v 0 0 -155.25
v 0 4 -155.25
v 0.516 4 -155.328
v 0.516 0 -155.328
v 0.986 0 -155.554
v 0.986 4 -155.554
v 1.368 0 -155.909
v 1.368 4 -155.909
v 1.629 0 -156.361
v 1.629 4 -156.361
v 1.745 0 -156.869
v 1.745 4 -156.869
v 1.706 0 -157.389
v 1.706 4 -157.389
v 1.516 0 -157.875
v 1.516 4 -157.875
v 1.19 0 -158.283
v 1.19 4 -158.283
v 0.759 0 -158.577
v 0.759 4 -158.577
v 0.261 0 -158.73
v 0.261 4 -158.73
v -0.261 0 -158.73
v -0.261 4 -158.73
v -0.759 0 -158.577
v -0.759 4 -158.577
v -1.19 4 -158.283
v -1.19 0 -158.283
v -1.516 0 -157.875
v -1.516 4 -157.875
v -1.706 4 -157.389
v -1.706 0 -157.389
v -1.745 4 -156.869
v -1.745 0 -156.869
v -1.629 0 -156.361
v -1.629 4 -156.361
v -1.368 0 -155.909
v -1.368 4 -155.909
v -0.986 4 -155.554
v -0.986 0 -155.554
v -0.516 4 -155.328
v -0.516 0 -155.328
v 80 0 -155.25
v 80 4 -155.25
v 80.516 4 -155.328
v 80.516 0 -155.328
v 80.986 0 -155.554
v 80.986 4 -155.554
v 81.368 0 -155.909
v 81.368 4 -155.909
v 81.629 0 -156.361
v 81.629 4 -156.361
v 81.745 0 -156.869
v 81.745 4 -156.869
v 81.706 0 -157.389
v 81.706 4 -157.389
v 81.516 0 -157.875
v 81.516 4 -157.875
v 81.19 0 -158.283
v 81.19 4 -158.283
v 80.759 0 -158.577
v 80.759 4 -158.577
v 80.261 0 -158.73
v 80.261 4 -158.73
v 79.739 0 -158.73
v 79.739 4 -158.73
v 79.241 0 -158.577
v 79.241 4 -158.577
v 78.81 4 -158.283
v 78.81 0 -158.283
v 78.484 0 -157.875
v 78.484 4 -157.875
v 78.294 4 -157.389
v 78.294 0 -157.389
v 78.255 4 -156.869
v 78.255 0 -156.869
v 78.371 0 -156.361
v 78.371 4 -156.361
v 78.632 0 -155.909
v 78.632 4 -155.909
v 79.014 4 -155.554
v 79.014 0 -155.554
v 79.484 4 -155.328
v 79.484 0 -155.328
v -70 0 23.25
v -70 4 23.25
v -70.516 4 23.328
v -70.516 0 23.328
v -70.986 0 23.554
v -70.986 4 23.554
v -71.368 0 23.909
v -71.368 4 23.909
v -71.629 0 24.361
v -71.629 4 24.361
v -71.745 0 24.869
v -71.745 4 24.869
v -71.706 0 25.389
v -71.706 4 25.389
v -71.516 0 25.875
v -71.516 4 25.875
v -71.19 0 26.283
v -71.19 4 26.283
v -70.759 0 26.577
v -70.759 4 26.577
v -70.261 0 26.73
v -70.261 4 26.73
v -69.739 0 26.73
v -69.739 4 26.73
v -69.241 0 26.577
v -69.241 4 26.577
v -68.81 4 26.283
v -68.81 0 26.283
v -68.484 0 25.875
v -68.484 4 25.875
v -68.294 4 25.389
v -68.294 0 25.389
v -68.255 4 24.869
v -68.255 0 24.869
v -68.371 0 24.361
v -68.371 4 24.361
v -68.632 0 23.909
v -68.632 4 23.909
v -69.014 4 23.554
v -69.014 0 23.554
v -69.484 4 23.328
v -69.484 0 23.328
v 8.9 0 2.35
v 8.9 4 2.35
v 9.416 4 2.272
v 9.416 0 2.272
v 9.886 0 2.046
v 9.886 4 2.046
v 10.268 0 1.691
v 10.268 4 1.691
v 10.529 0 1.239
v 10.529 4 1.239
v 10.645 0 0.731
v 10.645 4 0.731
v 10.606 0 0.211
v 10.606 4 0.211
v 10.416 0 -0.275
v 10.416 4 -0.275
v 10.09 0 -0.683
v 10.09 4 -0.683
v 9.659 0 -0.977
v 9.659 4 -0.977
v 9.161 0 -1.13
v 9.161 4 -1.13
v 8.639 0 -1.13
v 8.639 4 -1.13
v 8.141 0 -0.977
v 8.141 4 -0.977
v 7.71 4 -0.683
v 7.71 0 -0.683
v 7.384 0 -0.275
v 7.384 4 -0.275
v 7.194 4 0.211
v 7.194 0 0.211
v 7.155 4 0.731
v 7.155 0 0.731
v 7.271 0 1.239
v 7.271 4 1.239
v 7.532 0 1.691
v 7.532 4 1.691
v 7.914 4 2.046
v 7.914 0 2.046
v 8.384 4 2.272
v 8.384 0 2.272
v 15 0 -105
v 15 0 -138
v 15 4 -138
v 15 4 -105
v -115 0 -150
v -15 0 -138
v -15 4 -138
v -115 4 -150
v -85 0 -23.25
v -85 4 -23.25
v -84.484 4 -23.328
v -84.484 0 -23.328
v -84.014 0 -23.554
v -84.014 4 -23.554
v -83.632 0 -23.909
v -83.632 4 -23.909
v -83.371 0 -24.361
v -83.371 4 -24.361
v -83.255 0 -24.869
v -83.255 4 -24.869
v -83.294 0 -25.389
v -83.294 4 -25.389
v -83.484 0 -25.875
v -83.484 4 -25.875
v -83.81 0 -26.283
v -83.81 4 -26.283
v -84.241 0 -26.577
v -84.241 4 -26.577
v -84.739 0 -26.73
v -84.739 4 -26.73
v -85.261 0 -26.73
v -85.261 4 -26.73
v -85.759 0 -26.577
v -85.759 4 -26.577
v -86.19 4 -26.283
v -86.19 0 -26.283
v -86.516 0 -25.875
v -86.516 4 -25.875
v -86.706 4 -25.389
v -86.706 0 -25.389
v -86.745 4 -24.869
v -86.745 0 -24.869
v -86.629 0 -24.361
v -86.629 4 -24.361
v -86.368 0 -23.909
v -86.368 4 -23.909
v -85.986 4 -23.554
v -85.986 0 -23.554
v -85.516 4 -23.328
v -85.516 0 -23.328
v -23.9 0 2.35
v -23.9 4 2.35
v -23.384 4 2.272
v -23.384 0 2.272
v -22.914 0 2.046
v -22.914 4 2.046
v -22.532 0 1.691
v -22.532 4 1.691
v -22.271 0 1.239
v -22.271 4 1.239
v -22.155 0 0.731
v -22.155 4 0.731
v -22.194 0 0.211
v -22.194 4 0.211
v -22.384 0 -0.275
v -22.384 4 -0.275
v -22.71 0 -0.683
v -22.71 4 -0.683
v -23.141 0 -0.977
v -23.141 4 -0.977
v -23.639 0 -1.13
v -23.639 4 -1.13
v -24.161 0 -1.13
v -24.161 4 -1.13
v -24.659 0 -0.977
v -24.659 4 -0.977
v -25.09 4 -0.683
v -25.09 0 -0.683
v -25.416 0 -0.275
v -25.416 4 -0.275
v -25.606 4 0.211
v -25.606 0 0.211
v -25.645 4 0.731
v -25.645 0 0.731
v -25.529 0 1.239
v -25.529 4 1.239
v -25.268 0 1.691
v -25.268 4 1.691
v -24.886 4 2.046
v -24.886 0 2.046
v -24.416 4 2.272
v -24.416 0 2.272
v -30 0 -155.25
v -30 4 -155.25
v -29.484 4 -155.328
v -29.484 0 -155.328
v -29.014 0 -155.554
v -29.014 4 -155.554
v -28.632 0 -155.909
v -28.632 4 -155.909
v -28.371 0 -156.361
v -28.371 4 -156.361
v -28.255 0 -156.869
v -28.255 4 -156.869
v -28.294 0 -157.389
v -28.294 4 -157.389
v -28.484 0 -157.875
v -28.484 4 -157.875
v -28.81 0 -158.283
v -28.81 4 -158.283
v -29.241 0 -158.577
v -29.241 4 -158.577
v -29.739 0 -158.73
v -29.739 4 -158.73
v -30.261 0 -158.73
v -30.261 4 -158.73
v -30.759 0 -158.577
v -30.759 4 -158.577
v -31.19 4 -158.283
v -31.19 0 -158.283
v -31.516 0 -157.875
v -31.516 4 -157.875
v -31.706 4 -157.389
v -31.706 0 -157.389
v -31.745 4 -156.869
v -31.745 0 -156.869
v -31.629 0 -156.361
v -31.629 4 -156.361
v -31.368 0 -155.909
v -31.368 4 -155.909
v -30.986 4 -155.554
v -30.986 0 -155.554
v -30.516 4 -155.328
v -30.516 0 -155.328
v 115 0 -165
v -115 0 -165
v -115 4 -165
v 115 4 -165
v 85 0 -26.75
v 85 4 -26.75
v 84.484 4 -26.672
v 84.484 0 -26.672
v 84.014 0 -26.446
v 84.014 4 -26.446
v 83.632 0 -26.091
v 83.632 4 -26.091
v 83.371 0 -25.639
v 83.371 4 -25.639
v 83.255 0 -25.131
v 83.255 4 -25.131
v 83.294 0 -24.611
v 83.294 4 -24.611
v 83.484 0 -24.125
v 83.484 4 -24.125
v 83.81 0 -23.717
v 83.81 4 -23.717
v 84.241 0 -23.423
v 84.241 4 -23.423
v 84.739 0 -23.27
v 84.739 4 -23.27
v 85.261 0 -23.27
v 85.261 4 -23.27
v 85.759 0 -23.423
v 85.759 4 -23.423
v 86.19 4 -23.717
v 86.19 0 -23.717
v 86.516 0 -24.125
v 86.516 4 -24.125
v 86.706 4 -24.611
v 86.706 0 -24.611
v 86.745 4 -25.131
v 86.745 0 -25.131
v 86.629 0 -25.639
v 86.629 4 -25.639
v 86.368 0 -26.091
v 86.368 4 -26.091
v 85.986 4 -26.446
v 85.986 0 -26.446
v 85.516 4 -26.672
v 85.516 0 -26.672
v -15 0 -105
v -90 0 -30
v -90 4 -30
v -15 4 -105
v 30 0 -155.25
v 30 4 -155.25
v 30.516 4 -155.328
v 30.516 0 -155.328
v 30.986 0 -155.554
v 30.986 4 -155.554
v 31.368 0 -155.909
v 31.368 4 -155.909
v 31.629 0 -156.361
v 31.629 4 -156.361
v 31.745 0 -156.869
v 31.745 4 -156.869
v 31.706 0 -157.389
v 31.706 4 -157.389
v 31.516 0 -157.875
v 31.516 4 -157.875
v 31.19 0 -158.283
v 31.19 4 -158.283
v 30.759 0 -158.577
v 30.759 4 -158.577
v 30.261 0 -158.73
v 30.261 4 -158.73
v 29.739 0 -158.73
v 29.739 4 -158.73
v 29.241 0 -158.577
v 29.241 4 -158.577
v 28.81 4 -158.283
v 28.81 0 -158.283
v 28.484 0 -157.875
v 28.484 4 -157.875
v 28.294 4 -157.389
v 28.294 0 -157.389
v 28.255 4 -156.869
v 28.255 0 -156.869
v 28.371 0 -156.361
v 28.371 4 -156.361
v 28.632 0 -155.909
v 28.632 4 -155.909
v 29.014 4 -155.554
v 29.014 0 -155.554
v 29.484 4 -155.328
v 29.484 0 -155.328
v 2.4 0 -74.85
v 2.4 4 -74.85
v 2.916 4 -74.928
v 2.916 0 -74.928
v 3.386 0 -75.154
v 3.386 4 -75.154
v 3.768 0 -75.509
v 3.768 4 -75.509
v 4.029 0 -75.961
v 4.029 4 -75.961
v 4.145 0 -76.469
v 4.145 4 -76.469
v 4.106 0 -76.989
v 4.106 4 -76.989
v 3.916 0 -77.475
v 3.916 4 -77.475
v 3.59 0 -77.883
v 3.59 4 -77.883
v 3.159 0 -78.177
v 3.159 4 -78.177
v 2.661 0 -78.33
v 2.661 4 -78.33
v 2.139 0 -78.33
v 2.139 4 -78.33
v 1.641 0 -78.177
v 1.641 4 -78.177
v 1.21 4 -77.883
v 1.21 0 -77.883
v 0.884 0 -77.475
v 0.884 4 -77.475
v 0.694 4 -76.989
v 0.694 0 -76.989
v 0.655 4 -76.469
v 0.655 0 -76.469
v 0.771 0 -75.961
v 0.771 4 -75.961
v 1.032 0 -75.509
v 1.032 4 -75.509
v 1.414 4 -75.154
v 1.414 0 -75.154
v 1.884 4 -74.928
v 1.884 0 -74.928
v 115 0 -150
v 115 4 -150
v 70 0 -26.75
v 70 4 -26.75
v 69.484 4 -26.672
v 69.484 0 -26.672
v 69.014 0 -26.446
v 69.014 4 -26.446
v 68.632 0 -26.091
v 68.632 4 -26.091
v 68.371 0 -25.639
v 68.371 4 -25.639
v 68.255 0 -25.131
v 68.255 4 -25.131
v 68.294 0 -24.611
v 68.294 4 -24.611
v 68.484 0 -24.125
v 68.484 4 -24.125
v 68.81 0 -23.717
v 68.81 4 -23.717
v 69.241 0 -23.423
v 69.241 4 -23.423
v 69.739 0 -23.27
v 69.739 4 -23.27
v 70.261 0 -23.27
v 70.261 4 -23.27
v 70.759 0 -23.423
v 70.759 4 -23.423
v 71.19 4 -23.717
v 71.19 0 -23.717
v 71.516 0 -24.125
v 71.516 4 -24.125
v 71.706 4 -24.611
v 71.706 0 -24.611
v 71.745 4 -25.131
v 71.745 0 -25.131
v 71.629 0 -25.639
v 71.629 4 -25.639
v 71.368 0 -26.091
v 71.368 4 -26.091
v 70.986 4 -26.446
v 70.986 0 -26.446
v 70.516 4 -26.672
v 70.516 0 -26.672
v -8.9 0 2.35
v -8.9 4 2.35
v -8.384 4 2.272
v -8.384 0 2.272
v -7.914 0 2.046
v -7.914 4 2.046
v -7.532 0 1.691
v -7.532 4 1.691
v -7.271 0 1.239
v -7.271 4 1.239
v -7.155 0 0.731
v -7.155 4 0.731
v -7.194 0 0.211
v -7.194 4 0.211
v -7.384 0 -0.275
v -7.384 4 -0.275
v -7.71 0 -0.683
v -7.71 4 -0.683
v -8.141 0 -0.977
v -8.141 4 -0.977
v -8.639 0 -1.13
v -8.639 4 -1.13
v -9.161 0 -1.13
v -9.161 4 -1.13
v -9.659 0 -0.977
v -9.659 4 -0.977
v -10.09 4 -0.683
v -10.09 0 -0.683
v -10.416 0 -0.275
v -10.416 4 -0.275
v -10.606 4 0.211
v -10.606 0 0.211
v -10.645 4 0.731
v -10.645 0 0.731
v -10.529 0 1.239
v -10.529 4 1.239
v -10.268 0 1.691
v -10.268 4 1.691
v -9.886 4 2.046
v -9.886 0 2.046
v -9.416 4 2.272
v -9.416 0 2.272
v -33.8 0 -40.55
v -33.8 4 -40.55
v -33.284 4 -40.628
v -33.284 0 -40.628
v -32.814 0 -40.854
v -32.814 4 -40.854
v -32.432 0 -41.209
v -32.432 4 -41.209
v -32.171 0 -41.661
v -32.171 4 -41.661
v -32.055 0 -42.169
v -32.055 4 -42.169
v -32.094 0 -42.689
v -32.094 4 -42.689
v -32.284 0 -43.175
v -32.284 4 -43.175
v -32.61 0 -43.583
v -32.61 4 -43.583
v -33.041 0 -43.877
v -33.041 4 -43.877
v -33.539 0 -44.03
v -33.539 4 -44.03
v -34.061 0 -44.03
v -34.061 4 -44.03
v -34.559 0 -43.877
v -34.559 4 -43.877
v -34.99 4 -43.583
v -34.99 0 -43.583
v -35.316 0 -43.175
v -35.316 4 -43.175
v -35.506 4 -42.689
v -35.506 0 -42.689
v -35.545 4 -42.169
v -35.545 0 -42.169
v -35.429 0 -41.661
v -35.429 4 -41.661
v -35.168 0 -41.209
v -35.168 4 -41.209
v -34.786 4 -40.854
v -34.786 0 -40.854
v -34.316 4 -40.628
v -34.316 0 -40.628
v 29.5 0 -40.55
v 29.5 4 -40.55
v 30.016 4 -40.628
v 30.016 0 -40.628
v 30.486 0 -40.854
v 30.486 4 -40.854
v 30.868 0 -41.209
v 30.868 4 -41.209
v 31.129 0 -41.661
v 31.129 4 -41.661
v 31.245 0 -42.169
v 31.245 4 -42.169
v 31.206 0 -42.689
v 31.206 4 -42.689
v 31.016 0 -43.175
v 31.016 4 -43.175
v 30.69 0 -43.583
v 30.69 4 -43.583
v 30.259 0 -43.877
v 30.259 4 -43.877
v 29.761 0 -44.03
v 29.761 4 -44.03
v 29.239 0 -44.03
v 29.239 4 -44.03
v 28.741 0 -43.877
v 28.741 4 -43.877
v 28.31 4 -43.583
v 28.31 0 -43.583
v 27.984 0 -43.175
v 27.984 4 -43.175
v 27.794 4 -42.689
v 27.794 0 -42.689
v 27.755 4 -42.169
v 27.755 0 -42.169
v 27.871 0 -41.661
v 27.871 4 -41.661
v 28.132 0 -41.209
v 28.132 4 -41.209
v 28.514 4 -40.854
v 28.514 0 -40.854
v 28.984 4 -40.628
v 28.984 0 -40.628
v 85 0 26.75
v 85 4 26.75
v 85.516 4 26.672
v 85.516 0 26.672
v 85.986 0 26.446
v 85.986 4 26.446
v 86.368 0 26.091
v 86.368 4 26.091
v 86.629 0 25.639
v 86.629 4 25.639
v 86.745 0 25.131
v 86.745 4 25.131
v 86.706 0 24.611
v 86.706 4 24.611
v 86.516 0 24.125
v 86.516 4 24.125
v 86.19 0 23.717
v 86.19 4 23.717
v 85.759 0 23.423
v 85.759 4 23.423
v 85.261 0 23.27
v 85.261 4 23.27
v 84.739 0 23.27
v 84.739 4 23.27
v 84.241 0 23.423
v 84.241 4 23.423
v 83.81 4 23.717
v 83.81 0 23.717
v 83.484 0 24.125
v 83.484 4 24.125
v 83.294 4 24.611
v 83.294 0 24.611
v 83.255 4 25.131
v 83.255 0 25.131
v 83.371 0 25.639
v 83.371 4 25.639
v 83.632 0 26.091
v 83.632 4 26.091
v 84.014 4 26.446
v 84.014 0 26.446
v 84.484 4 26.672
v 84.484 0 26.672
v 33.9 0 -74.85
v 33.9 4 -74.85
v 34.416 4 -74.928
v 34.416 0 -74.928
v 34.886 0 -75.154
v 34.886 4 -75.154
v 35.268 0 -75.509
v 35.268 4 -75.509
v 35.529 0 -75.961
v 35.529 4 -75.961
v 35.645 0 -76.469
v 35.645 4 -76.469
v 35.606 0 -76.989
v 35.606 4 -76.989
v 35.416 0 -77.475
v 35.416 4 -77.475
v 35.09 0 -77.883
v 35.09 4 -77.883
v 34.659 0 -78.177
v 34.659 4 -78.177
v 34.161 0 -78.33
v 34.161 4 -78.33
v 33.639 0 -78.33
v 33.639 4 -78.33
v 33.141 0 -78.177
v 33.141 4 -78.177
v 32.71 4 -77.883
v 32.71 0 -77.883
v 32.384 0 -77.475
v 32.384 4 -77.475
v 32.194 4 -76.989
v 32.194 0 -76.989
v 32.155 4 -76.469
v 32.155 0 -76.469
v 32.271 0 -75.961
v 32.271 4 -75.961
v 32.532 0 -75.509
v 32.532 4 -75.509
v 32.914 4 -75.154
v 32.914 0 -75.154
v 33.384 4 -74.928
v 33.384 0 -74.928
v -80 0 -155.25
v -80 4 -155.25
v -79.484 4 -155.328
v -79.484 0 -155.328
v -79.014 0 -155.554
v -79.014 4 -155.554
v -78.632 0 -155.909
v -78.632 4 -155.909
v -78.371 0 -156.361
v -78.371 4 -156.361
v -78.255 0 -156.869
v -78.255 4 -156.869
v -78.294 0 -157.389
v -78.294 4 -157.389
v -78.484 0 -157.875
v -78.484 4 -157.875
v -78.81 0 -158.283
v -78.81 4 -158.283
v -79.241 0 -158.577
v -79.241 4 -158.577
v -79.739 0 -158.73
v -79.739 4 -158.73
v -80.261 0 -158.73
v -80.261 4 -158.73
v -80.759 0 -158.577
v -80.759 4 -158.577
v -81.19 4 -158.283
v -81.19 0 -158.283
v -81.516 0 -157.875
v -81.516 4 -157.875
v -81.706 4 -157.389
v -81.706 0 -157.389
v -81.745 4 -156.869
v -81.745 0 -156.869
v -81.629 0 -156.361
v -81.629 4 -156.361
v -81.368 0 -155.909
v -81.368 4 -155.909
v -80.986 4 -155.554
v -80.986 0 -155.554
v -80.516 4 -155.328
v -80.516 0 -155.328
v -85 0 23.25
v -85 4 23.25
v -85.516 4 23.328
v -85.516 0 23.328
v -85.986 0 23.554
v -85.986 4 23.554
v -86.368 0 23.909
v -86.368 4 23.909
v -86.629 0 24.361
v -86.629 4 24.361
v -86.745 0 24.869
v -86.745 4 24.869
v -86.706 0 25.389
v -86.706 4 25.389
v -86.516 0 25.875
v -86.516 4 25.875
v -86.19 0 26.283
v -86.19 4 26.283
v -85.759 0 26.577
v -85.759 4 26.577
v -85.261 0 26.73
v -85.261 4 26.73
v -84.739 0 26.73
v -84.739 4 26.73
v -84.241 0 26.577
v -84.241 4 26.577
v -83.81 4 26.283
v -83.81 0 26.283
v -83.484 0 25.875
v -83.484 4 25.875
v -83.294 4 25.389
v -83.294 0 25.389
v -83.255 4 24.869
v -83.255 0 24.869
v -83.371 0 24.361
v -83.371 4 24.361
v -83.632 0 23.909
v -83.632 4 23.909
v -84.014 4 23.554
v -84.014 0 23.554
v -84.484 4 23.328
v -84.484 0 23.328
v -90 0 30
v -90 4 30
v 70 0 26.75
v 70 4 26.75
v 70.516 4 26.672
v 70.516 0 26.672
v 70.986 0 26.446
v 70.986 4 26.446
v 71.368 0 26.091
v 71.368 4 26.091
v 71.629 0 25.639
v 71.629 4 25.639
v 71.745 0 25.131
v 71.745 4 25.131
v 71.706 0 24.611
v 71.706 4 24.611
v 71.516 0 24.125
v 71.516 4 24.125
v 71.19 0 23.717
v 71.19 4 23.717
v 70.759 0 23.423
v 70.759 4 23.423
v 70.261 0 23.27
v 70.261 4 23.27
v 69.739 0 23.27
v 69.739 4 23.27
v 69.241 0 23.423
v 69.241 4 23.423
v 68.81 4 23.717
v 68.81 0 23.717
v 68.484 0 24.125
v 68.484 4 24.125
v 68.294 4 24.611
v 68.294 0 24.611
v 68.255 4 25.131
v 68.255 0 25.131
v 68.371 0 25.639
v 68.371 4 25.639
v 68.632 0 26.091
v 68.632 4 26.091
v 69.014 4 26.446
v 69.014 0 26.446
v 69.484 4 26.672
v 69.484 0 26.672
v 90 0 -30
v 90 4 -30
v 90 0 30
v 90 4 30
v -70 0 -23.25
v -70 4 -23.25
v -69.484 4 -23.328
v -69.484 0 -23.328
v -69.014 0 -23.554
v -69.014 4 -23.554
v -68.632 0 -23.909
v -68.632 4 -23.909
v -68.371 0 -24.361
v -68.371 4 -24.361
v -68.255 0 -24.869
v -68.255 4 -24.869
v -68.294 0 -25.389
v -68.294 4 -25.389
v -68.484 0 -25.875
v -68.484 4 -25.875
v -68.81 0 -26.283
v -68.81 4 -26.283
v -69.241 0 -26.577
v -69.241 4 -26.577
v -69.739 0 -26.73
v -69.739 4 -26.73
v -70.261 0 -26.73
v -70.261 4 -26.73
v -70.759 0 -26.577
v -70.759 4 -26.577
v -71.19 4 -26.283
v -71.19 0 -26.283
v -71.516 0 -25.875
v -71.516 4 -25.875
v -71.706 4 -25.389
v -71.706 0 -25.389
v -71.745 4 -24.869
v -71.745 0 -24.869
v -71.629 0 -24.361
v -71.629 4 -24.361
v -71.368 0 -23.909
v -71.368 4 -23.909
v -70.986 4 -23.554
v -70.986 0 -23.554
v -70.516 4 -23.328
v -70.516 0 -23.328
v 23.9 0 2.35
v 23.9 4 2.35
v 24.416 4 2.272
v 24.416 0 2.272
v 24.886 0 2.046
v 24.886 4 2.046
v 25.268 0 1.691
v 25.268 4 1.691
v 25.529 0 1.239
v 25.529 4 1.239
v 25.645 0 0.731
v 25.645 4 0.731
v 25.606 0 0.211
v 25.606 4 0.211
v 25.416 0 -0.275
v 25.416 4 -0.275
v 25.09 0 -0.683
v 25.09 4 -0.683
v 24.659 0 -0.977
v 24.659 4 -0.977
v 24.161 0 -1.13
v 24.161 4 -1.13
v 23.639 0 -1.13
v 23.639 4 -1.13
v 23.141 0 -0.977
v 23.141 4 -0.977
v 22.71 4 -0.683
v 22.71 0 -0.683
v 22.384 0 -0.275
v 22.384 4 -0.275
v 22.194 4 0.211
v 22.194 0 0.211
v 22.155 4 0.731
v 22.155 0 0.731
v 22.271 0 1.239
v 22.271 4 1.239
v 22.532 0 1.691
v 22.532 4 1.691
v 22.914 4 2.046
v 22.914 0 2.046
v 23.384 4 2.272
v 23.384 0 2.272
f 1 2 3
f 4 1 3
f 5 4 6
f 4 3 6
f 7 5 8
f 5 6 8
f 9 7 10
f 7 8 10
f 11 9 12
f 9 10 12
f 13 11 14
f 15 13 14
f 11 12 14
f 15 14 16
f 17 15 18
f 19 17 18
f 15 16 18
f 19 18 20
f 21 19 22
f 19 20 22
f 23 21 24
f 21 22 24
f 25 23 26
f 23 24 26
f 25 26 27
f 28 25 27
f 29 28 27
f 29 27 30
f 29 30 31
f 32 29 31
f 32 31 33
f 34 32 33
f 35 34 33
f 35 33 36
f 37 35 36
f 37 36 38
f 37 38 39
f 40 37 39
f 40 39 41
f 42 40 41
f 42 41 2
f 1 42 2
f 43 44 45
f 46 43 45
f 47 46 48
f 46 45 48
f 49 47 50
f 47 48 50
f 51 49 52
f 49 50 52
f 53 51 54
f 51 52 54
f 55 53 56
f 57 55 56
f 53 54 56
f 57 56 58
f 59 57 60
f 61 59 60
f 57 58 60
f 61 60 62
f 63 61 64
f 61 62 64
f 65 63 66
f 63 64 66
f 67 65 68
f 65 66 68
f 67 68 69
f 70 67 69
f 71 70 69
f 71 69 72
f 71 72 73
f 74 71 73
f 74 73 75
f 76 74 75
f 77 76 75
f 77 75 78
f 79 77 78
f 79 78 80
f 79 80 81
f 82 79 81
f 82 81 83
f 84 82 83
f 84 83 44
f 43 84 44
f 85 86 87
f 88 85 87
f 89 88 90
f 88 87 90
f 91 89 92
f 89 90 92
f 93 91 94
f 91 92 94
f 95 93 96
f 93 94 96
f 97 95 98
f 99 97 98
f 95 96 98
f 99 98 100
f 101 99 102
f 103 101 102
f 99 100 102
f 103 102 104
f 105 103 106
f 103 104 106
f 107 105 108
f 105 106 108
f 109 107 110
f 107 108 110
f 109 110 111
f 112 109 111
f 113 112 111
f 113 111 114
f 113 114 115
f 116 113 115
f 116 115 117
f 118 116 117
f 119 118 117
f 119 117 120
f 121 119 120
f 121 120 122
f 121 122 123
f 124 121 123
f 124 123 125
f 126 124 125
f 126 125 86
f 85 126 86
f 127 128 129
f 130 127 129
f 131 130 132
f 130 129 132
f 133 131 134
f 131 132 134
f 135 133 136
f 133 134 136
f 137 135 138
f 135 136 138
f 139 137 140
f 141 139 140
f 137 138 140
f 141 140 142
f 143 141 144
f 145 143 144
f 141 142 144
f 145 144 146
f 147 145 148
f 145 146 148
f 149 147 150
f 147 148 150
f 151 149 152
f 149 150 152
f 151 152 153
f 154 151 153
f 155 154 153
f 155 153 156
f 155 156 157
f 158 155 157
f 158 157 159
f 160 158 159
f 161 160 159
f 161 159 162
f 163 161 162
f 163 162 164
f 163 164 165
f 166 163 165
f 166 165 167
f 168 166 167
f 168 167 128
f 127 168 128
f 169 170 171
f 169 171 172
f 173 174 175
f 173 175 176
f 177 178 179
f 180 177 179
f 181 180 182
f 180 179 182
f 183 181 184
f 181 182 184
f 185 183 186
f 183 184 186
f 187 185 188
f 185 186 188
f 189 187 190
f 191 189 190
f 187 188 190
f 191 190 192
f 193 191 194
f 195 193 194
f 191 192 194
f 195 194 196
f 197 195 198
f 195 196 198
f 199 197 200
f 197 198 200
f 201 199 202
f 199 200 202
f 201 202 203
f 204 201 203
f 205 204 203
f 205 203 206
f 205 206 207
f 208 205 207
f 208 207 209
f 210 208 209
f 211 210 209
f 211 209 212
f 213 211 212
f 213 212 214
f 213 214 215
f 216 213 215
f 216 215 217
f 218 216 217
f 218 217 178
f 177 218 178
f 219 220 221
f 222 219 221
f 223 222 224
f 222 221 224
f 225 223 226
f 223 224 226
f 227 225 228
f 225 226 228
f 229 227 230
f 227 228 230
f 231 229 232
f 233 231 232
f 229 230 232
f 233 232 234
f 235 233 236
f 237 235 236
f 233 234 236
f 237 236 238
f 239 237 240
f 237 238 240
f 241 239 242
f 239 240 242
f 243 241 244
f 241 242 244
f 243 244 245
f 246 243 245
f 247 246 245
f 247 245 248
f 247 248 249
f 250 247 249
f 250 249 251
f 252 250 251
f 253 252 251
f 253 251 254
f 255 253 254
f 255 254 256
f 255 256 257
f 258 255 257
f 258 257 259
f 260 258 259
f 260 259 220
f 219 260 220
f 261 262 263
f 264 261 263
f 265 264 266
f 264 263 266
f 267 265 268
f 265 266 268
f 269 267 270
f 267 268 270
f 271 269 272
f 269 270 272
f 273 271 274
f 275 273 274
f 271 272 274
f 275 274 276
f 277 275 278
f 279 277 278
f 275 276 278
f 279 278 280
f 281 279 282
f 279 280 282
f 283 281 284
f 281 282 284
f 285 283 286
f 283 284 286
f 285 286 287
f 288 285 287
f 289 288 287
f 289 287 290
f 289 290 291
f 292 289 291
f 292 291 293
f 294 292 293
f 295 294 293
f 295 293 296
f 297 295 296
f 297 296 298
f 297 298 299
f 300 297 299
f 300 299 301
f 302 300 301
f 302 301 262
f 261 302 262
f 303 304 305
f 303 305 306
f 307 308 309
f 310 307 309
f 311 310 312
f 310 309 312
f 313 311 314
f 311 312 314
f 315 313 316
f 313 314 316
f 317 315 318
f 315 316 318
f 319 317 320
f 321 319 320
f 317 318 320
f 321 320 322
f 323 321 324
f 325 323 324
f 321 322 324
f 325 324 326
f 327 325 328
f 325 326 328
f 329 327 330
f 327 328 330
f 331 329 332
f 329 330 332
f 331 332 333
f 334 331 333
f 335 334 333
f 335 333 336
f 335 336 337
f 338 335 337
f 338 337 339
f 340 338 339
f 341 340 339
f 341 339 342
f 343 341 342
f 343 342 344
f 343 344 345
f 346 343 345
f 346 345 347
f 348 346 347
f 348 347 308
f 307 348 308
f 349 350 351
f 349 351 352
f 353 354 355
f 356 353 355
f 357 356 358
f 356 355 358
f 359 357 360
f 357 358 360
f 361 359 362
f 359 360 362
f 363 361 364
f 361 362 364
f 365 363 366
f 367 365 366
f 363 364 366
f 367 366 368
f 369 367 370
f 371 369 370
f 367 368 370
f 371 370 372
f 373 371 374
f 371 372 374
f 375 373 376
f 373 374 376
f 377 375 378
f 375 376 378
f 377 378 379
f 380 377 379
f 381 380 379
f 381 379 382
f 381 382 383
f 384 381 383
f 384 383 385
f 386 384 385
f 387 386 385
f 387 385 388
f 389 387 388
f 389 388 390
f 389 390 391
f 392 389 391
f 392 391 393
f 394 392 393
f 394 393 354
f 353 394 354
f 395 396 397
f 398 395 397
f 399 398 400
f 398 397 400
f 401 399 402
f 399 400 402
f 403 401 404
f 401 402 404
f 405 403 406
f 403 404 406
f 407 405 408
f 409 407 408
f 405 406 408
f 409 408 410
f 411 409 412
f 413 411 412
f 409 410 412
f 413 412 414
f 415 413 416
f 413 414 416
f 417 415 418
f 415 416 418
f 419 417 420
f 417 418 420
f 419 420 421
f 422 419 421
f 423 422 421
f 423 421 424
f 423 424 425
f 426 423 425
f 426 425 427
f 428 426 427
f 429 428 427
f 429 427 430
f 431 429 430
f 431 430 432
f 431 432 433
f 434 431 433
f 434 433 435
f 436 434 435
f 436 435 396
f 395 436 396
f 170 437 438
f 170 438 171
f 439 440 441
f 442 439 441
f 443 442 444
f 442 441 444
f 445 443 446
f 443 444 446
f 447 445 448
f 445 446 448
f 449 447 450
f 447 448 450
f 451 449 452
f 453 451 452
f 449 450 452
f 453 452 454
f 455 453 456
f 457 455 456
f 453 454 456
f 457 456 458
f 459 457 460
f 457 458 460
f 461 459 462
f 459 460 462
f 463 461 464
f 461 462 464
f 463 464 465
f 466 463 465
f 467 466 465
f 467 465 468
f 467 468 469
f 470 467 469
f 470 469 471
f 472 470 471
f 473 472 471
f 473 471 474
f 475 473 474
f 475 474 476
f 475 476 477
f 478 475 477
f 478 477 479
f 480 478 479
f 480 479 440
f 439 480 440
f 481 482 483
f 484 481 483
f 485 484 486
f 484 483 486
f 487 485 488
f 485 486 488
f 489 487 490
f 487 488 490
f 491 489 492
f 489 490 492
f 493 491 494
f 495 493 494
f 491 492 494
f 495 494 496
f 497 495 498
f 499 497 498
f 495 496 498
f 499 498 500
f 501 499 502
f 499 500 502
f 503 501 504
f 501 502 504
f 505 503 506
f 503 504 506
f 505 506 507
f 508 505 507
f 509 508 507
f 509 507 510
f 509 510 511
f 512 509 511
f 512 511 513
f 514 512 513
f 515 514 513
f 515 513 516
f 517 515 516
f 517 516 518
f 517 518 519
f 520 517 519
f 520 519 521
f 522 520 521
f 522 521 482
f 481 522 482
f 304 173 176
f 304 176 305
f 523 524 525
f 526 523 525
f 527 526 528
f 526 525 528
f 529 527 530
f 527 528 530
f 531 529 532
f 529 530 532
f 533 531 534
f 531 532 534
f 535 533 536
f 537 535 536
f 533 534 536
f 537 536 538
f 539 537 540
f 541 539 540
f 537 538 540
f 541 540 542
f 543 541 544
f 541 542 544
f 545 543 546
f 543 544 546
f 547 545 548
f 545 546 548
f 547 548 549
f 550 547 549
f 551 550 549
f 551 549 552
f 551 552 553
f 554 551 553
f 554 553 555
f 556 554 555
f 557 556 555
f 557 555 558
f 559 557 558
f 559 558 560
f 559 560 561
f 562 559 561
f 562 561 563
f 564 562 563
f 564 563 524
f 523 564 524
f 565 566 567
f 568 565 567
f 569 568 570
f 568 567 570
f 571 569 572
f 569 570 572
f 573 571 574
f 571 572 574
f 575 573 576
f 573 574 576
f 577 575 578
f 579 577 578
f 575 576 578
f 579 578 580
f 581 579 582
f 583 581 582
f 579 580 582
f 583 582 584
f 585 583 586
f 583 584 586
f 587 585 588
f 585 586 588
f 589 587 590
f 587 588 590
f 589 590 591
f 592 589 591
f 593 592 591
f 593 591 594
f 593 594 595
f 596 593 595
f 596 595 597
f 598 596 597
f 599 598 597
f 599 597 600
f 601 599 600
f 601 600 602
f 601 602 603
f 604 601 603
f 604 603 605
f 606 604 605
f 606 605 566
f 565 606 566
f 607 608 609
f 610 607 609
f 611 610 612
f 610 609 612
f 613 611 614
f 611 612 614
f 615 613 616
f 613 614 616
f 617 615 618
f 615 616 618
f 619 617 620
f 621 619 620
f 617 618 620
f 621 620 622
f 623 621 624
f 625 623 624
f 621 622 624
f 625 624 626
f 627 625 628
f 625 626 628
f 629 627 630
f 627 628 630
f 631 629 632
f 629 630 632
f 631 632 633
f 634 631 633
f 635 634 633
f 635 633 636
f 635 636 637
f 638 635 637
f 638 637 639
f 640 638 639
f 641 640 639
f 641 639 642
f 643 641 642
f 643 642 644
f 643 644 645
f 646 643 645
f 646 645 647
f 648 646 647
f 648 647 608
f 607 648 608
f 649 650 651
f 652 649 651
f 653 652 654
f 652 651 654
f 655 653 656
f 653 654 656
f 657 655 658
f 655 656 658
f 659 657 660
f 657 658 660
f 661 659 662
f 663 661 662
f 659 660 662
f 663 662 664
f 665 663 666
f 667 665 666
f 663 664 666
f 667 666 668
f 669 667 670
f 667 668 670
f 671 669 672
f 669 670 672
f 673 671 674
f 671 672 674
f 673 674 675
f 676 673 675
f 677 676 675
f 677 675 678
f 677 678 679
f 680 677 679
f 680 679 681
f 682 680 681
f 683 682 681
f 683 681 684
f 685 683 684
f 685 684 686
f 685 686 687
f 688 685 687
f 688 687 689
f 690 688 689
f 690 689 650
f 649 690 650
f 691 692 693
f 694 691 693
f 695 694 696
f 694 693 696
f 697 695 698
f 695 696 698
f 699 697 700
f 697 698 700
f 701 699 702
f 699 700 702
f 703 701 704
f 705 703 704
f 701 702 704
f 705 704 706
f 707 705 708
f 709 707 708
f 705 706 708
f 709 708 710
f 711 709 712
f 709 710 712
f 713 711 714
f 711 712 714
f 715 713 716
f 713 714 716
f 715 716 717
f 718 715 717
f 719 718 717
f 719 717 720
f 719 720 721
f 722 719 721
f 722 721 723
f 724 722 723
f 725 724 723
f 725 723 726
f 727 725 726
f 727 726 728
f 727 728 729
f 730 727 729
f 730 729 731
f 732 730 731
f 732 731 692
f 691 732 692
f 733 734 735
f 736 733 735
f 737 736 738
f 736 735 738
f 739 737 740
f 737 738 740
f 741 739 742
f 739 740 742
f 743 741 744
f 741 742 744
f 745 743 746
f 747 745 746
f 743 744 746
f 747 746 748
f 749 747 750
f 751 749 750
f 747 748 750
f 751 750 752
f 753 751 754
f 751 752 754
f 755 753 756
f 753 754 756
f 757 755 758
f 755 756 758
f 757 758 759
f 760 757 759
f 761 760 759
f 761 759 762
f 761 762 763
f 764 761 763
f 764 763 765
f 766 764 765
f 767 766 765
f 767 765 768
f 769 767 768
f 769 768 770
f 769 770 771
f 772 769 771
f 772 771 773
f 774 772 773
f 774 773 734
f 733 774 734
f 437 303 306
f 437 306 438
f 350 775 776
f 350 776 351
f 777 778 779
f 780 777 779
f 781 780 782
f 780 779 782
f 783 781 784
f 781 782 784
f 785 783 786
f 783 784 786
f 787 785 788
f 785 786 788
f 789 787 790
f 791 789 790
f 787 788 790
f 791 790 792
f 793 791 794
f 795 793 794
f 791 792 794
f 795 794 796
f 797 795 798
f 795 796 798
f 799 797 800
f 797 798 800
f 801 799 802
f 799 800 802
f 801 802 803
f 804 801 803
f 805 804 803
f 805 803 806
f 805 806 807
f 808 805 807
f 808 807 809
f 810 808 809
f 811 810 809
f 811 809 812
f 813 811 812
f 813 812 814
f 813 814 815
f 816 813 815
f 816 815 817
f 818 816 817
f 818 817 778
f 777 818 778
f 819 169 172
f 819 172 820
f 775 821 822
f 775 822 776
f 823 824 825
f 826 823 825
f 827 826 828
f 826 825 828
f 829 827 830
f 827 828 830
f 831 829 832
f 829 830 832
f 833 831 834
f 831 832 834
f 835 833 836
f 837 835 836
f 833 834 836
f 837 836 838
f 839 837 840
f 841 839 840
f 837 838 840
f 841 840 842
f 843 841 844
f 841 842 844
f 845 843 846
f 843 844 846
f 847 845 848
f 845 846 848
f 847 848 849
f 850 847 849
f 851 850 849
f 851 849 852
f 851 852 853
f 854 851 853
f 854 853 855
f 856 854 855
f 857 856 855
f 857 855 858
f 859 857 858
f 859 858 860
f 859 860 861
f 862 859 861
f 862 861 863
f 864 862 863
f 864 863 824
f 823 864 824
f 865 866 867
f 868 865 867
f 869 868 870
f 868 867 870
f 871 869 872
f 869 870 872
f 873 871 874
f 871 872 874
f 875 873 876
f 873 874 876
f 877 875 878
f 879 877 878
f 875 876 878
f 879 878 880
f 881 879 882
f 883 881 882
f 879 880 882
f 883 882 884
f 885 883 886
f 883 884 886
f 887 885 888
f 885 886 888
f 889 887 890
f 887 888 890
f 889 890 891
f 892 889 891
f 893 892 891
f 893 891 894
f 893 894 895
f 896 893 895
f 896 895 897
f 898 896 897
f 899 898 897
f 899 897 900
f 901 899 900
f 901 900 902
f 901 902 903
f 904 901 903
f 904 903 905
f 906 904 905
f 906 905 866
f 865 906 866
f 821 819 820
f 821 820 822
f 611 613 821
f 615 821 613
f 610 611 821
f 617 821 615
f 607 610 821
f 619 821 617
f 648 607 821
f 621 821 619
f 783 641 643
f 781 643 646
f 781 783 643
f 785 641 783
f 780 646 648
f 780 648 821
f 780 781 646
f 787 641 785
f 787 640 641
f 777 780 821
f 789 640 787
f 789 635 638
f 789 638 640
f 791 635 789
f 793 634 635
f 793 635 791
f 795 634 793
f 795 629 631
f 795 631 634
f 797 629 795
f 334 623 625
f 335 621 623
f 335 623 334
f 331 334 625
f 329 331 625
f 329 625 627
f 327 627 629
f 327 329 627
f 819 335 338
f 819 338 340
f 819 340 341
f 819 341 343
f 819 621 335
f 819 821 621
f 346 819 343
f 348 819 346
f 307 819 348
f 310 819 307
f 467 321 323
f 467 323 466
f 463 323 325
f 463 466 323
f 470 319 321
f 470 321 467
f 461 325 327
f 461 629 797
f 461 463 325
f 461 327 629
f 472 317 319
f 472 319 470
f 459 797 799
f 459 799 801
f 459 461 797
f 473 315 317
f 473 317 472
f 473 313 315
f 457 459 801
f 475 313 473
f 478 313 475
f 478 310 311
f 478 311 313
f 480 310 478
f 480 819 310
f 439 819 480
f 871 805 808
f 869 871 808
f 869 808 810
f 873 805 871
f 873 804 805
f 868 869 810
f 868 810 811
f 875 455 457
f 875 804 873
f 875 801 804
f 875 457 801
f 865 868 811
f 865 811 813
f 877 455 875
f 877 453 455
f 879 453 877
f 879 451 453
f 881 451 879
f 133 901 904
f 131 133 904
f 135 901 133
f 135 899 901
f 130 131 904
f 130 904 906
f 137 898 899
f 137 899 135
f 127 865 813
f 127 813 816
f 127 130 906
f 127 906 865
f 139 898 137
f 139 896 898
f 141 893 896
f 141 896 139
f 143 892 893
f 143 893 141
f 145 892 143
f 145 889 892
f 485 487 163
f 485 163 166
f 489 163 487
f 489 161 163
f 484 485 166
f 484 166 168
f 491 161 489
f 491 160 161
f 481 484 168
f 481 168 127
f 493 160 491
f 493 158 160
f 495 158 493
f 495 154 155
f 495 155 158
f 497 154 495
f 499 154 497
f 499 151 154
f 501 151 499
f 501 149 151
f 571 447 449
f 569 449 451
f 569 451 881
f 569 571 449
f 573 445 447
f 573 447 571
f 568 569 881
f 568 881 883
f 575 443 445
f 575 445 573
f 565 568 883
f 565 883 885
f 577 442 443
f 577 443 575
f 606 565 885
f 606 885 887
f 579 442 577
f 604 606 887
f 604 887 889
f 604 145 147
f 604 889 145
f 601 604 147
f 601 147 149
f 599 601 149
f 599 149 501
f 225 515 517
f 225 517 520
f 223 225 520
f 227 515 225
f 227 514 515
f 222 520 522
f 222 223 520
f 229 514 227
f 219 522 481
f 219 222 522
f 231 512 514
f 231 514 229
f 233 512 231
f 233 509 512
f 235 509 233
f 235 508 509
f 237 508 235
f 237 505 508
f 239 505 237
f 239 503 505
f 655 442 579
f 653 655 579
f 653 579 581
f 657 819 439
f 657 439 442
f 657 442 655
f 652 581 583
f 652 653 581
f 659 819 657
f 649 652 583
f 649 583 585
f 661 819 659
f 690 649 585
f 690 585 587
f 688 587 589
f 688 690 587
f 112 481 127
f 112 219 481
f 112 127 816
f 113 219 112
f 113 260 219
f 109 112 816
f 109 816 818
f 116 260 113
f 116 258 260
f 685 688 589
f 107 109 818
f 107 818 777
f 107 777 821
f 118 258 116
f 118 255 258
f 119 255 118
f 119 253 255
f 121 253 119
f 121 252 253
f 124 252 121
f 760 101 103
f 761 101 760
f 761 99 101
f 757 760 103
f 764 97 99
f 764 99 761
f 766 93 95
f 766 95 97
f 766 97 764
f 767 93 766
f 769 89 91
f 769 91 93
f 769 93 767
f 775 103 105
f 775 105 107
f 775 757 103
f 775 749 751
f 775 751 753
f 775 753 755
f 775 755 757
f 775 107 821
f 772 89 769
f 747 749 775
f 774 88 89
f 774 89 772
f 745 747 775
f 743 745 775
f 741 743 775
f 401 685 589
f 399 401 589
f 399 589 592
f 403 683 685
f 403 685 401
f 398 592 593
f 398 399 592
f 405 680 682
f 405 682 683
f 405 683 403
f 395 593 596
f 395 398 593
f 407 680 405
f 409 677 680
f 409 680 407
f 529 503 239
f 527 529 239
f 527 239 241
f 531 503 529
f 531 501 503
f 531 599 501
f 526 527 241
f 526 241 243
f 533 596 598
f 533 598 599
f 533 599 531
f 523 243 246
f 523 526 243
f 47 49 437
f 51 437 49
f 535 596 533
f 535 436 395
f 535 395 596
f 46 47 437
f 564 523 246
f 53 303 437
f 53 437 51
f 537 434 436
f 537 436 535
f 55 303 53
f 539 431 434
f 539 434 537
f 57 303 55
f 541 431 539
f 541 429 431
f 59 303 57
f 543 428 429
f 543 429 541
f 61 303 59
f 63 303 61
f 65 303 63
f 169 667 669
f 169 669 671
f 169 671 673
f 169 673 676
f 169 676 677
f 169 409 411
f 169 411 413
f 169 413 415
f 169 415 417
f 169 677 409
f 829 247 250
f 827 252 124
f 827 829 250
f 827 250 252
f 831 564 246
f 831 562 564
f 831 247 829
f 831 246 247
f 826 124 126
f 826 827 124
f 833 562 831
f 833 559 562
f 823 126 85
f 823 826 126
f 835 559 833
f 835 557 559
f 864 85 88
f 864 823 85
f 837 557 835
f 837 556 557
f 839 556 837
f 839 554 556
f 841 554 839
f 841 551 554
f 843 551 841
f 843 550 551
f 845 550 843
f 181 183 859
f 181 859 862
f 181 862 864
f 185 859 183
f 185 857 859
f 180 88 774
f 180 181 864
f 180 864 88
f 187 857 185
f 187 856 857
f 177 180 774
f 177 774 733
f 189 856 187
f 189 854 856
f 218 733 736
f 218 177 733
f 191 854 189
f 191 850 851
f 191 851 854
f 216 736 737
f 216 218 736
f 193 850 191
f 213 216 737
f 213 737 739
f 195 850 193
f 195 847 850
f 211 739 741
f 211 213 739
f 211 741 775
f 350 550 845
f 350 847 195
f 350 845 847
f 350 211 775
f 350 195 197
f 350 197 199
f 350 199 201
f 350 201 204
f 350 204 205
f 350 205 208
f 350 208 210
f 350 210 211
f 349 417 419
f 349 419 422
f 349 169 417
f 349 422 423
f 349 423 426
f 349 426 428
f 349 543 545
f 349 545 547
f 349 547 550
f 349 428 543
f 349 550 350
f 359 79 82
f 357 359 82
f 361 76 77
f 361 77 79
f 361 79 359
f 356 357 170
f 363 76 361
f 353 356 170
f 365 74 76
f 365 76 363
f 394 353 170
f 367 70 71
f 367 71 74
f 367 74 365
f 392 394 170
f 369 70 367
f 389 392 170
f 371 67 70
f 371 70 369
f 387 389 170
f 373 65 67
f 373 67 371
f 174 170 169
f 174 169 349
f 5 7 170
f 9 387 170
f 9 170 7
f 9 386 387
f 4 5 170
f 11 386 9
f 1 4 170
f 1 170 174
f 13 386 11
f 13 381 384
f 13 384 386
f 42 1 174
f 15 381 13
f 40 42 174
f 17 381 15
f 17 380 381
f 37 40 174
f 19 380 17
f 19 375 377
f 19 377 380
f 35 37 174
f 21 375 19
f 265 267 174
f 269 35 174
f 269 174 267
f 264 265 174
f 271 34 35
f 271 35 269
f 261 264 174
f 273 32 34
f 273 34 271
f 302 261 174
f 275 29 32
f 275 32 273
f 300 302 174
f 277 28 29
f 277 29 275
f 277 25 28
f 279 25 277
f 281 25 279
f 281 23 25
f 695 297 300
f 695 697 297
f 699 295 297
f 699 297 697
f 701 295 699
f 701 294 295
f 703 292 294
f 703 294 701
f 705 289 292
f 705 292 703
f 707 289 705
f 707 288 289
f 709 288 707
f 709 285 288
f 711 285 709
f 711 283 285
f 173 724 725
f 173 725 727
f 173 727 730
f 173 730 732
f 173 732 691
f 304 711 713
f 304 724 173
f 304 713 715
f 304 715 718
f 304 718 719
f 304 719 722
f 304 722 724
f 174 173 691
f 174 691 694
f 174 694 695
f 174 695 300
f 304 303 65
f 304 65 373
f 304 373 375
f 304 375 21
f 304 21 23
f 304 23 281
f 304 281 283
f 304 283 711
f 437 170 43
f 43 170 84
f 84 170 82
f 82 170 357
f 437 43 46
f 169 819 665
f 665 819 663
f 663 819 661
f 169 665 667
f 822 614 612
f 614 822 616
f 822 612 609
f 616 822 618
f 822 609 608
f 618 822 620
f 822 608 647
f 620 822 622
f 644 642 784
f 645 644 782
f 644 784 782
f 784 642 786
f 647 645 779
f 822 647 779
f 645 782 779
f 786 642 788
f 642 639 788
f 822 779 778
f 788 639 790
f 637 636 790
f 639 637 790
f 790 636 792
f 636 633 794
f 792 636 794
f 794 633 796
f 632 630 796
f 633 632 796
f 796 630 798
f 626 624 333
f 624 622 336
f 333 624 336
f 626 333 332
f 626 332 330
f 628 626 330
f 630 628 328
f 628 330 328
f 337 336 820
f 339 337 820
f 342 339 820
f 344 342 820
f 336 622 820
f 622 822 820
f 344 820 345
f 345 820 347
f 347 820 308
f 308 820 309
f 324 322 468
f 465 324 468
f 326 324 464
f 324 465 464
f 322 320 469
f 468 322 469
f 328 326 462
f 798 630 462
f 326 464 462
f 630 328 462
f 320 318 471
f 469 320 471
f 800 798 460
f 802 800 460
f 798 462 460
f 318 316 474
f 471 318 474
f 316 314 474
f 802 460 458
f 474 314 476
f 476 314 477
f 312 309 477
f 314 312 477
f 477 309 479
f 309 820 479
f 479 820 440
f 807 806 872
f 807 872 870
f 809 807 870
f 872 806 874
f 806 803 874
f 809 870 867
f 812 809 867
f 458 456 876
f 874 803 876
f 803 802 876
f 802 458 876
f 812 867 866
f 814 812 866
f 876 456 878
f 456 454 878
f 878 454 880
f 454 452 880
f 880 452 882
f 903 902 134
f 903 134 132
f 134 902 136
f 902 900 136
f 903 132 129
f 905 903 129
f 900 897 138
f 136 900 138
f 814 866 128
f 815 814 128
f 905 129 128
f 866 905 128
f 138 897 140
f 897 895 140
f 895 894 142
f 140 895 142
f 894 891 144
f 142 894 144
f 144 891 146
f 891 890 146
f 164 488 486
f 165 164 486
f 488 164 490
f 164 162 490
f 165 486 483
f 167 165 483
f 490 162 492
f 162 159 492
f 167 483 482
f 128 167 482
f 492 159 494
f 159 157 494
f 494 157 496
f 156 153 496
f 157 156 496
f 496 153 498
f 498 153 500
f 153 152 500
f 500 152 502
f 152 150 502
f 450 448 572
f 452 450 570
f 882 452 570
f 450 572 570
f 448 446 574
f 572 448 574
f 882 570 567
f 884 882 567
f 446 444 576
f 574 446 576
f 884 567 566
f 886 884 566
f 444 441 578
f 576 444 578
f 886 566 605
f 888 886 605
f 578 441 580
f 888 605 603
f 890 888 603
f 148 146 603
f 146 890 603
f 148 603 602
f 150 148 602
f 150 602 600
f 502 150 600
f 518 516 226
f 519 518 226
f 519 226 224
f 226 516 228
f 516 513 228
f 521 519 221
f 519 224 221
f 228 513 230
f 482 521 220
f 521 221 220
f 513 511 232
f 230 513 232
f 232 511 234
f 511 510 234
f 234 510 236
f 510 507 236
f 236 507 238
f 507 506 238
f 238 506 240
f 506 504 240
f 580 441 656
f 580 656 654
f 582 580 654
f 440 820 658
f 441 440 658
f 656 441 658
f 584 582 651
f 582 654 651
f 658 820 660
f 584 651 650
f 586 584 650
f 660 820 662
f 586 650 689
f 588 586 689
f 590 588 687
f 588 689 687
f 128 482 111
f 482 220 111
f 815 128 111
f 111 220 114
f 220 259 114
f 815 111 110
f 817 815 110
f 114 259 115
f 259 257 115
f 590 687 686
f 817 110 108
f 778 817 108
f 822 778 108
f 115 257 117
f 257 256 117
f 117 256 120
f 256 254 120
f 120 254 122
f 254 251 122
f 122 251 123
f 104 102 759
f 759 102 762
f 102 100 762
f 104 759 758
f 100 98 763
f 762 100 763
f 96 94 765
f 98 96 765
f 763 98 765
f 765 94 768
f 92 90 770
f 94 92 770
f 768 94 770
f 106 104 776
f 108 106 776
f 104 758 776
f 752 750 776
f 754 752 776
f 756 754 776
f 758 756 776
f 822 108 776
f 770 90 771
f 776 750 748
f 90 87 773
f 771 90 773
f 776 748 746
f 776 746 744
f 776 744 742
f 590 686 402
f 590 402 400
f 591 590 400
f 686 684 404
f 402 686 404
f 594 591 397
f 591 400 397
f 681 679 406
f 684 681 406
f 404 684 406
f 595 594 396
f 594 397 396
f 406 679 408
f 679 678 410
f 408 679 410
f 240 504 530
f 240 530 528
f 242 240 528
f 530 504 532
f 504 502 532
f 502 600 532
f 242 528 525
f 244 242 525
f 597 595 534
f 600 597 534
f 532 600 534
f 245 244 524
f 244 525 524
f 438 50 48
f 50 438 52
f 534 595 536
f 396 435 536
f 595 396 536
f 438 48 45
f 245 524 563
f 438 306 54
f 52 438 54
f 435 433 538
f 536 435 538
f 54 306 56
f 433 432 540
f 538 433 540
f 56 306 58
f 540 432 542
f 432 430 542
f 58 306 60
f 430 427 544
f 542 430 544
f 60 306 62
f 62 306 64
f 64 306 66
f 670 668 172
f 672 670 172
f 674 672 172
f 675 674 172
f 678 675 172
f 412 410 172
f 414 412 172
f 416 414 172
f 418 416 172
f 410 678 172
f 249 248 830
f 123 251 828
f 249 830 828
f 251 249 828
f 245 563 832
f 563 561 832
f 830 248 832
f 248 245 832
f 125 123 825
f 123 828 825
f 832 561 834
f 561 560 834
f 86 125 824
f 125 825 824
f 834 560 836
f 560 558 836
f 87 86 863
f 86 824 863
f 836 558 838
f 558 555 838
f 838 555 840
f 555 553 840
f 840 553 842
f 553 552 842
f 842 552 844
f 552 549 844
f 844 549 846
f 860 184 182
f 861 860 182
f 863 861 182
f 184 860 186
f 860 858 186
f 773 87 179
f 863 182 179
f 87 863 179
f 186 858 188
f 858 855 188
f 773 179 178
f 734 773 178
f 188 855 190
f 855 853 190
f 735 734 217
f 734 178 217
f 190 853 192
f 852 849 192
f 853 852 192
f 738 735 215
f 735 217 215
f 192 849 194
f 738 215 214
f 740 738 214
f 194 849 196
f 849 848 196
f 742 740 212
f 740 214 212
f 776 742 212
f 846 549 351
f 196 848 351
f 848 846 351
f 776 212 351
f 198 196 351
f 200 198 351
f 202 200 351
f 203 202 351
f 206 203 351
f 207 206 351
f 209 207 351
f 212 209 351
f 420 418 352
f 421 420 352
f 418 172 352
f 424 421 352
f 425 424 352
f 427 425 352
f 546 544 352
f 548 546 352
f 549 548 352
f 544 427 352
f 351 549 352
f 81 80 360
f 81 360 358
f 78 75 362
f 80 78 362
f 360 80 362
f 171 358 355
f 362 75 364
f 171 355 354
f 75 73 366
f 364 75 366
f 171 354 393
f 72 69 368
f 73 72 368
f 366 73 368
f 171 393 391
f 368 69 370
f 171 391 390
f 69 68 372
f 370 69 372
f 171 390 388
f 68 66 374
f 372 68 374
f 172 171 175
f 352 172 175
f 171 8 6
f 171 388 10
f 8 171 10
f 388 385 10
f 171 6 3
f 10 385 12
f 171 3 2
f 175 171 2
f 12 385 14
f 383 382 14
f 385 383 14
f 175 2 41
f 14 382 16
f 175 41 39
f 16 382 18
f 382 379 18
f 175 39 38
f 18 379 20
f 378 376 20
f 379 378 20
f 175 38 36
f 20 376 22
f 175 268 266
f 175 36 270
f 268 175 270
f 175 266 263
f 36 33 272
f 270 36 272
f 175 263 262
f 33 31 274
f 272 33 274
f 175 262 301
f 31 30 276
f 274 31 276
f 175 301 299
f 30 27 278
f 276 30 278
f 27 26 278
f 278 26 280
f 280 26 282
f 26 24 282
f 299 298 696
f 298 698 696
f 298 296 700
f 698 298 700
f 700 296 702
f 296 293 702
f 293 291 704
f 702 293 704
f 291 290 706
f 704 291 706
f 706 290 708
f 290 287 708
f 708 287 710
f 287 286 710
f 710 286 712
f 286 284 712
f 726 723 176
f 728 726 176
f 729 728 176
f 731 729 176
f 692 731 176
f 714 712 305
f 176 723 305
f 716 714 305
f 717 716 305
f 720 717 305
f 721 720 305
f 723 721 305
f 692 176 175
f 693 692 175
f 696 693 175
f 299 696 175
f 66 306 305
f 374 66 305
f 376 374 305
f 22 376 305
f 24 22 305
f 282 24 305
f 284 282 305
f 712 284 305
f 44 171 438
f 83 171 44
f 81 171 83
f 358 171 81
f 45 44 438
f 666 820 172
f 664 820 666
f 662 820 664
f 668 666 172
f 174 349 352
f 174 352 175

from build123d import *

# Parameters (mm, degrees)
BOSS_EXTRUDE1_DEPTH = 4
SKETCH2_R           = 1.75
CUT_EXTRUDE1_DEPTH  = 202.161626559
SKETCH3_R           = 1.75
CUT_EXTRUDE2_DEPTH  = 202.161626559
SKETCH4_R           = 1.75
CUT_EXTRUDE3_DEPTH  = 202.161626559
SKETCH5_R           = 1.75
CUT_EXTRUDE4_DEPTH  = 202.161626559


with BuildPart() as part:
    # Sketch1 → Boss-Extrude1 (new body)
    with BuildSketch(Plane(origin=(0, 0, 0), x_dir=(1, 0, 0), z_dir=(0, 1, 0))):
        Polygon((-90, 30), (-15, 105), (-15, 138), (-115, 150), (-115, 165), (115, 165), (115, 150), (15, 138), (15, 105), (90, 30), (90, -30), (-90, -30), align=None)
    extrude(amount=BOSS_EXTRUDE1_DEPTH)

    # Sketch2 → Cut-Extrude1 (cut, through all)
    with BuildSketch(Plane(origin=(0, 4, 0), x_dir=(1, 0, 0), z_dir=(0, 1, 0))):
        with Locations(Location((-85, 25, 0), (0, 0, 270))):
            Circle(SKETCH2_R)
        with Locations(Location((85, 25, 0), (0, 0, 90))):
            Circle(SKETCH2_R)
        with Locations(Location((85, -25, 0), (0, 0, 270))):
            Circle(SKETCH2_R)
        with Locations(Location((-85, -25, 0), (0, 0, 90))):
            Circle(SKETCH2_R)
        with Locations(Location((-70, 25, 0), (0, 0, 270))):
            Circle(SKETCH2_R)
        with Locations(Location((-70, -25, 0), (0, 0, 90))):
            Circle(SKETCH2_R)
        with Locations(Location((70, -25, 0), (0, 0, 270))):
            Circle(SKETCH2_R)
        with Locations(Location((70, 25, 0), (0, 0, 90))):
            Circle(SKETCH2_R)
    extrude(amount=-CUT_EXTRUDE1_DEPTH, mode=Mode.SUBTRACT)

    # Sketch3 → Cut-Extrude2 (cut, through all)
    with BuildSketch(Plane(origin=(0, 4, 0), x_dir=(1, 0, 0), z_dir=(0, 1, 0))):
        with Locations(Location((2.4, 76.6, 0), (0, 0, 270))):
            Circle(SKETCH3_R)
        with Locations(Location((-33.8, 42.3, 0), (0, 0, 270))):
            Circle(SKETCH3_R)
        with Locations(Location((33.9, 76.6, 0), (0, 0, 270))):
            Circle(SKETCH3_R)
        with Locations(Location((29.5, 42.3, 0), (0, 0, 270))):
            Circle(SKETCH3_R)
    extrude(amount=-CUT_EXTRUDE2_DEPTH, mode=Mode.SUBTRACT)

    # Sketch4 → Cut-Extrude3 (cut, through all)
    with BuildSketch(Plane(origin=(0, 4, 0), x_dir=(1, 0, 0), z_dir=(0, 1, 0))):
        with Locations(Location((-23.9, -0.6, 0), (0, 0, 270))):
            Circle(SKETCH4_R)
        with Locations(Location((-8.9, -0.6, 0), (0, 0, 270))):
            Circle(SKETCH4_R)
        with Locations(Location((8.9, -0.6, 0), (0, 0, 270))):
            Circle(SKETCH4_R)
        with Locations(Location((23.9, -0.6, 0), (0, 0, 270))):
            Circle(SKETCH4_R)
    extrude(amount=-CUT_EXTRUDE3_DEPTH, mode=Mode.SUBTRACT)

    # Sketch5 → Cut-Extrude4 (cut, through all)
    with BuildSketch(Plane(origin=(0, 4, 0), x_dir=(1, 0, 0), z_dir=(0, 1, 0))):
        with Locations(Location((0, 157, 0), (0, 0, 270))):
            Circle(SKETCH5_R)
        with Locations(Location((-30, 157, 0), (0, 0, 270))):
            Circle(SKETCH5_R)
        with Locations(Location((30, 157, 0), (0, 0, 270))):
            Circle(SKETCH5_R)
        with Locations(Location((80, 157, 0), (0, 0, 270))):
            Circle(SKETCH5_R)
        with Locations(Location((-80, 157, 0), (0, 0, 270))):
            Circle(SKETCH5_R)
    extrude(amount=-CUT_EXTRUDE4_DEPTH, mode=Mode.SUBTRACT)


solid = part.part
